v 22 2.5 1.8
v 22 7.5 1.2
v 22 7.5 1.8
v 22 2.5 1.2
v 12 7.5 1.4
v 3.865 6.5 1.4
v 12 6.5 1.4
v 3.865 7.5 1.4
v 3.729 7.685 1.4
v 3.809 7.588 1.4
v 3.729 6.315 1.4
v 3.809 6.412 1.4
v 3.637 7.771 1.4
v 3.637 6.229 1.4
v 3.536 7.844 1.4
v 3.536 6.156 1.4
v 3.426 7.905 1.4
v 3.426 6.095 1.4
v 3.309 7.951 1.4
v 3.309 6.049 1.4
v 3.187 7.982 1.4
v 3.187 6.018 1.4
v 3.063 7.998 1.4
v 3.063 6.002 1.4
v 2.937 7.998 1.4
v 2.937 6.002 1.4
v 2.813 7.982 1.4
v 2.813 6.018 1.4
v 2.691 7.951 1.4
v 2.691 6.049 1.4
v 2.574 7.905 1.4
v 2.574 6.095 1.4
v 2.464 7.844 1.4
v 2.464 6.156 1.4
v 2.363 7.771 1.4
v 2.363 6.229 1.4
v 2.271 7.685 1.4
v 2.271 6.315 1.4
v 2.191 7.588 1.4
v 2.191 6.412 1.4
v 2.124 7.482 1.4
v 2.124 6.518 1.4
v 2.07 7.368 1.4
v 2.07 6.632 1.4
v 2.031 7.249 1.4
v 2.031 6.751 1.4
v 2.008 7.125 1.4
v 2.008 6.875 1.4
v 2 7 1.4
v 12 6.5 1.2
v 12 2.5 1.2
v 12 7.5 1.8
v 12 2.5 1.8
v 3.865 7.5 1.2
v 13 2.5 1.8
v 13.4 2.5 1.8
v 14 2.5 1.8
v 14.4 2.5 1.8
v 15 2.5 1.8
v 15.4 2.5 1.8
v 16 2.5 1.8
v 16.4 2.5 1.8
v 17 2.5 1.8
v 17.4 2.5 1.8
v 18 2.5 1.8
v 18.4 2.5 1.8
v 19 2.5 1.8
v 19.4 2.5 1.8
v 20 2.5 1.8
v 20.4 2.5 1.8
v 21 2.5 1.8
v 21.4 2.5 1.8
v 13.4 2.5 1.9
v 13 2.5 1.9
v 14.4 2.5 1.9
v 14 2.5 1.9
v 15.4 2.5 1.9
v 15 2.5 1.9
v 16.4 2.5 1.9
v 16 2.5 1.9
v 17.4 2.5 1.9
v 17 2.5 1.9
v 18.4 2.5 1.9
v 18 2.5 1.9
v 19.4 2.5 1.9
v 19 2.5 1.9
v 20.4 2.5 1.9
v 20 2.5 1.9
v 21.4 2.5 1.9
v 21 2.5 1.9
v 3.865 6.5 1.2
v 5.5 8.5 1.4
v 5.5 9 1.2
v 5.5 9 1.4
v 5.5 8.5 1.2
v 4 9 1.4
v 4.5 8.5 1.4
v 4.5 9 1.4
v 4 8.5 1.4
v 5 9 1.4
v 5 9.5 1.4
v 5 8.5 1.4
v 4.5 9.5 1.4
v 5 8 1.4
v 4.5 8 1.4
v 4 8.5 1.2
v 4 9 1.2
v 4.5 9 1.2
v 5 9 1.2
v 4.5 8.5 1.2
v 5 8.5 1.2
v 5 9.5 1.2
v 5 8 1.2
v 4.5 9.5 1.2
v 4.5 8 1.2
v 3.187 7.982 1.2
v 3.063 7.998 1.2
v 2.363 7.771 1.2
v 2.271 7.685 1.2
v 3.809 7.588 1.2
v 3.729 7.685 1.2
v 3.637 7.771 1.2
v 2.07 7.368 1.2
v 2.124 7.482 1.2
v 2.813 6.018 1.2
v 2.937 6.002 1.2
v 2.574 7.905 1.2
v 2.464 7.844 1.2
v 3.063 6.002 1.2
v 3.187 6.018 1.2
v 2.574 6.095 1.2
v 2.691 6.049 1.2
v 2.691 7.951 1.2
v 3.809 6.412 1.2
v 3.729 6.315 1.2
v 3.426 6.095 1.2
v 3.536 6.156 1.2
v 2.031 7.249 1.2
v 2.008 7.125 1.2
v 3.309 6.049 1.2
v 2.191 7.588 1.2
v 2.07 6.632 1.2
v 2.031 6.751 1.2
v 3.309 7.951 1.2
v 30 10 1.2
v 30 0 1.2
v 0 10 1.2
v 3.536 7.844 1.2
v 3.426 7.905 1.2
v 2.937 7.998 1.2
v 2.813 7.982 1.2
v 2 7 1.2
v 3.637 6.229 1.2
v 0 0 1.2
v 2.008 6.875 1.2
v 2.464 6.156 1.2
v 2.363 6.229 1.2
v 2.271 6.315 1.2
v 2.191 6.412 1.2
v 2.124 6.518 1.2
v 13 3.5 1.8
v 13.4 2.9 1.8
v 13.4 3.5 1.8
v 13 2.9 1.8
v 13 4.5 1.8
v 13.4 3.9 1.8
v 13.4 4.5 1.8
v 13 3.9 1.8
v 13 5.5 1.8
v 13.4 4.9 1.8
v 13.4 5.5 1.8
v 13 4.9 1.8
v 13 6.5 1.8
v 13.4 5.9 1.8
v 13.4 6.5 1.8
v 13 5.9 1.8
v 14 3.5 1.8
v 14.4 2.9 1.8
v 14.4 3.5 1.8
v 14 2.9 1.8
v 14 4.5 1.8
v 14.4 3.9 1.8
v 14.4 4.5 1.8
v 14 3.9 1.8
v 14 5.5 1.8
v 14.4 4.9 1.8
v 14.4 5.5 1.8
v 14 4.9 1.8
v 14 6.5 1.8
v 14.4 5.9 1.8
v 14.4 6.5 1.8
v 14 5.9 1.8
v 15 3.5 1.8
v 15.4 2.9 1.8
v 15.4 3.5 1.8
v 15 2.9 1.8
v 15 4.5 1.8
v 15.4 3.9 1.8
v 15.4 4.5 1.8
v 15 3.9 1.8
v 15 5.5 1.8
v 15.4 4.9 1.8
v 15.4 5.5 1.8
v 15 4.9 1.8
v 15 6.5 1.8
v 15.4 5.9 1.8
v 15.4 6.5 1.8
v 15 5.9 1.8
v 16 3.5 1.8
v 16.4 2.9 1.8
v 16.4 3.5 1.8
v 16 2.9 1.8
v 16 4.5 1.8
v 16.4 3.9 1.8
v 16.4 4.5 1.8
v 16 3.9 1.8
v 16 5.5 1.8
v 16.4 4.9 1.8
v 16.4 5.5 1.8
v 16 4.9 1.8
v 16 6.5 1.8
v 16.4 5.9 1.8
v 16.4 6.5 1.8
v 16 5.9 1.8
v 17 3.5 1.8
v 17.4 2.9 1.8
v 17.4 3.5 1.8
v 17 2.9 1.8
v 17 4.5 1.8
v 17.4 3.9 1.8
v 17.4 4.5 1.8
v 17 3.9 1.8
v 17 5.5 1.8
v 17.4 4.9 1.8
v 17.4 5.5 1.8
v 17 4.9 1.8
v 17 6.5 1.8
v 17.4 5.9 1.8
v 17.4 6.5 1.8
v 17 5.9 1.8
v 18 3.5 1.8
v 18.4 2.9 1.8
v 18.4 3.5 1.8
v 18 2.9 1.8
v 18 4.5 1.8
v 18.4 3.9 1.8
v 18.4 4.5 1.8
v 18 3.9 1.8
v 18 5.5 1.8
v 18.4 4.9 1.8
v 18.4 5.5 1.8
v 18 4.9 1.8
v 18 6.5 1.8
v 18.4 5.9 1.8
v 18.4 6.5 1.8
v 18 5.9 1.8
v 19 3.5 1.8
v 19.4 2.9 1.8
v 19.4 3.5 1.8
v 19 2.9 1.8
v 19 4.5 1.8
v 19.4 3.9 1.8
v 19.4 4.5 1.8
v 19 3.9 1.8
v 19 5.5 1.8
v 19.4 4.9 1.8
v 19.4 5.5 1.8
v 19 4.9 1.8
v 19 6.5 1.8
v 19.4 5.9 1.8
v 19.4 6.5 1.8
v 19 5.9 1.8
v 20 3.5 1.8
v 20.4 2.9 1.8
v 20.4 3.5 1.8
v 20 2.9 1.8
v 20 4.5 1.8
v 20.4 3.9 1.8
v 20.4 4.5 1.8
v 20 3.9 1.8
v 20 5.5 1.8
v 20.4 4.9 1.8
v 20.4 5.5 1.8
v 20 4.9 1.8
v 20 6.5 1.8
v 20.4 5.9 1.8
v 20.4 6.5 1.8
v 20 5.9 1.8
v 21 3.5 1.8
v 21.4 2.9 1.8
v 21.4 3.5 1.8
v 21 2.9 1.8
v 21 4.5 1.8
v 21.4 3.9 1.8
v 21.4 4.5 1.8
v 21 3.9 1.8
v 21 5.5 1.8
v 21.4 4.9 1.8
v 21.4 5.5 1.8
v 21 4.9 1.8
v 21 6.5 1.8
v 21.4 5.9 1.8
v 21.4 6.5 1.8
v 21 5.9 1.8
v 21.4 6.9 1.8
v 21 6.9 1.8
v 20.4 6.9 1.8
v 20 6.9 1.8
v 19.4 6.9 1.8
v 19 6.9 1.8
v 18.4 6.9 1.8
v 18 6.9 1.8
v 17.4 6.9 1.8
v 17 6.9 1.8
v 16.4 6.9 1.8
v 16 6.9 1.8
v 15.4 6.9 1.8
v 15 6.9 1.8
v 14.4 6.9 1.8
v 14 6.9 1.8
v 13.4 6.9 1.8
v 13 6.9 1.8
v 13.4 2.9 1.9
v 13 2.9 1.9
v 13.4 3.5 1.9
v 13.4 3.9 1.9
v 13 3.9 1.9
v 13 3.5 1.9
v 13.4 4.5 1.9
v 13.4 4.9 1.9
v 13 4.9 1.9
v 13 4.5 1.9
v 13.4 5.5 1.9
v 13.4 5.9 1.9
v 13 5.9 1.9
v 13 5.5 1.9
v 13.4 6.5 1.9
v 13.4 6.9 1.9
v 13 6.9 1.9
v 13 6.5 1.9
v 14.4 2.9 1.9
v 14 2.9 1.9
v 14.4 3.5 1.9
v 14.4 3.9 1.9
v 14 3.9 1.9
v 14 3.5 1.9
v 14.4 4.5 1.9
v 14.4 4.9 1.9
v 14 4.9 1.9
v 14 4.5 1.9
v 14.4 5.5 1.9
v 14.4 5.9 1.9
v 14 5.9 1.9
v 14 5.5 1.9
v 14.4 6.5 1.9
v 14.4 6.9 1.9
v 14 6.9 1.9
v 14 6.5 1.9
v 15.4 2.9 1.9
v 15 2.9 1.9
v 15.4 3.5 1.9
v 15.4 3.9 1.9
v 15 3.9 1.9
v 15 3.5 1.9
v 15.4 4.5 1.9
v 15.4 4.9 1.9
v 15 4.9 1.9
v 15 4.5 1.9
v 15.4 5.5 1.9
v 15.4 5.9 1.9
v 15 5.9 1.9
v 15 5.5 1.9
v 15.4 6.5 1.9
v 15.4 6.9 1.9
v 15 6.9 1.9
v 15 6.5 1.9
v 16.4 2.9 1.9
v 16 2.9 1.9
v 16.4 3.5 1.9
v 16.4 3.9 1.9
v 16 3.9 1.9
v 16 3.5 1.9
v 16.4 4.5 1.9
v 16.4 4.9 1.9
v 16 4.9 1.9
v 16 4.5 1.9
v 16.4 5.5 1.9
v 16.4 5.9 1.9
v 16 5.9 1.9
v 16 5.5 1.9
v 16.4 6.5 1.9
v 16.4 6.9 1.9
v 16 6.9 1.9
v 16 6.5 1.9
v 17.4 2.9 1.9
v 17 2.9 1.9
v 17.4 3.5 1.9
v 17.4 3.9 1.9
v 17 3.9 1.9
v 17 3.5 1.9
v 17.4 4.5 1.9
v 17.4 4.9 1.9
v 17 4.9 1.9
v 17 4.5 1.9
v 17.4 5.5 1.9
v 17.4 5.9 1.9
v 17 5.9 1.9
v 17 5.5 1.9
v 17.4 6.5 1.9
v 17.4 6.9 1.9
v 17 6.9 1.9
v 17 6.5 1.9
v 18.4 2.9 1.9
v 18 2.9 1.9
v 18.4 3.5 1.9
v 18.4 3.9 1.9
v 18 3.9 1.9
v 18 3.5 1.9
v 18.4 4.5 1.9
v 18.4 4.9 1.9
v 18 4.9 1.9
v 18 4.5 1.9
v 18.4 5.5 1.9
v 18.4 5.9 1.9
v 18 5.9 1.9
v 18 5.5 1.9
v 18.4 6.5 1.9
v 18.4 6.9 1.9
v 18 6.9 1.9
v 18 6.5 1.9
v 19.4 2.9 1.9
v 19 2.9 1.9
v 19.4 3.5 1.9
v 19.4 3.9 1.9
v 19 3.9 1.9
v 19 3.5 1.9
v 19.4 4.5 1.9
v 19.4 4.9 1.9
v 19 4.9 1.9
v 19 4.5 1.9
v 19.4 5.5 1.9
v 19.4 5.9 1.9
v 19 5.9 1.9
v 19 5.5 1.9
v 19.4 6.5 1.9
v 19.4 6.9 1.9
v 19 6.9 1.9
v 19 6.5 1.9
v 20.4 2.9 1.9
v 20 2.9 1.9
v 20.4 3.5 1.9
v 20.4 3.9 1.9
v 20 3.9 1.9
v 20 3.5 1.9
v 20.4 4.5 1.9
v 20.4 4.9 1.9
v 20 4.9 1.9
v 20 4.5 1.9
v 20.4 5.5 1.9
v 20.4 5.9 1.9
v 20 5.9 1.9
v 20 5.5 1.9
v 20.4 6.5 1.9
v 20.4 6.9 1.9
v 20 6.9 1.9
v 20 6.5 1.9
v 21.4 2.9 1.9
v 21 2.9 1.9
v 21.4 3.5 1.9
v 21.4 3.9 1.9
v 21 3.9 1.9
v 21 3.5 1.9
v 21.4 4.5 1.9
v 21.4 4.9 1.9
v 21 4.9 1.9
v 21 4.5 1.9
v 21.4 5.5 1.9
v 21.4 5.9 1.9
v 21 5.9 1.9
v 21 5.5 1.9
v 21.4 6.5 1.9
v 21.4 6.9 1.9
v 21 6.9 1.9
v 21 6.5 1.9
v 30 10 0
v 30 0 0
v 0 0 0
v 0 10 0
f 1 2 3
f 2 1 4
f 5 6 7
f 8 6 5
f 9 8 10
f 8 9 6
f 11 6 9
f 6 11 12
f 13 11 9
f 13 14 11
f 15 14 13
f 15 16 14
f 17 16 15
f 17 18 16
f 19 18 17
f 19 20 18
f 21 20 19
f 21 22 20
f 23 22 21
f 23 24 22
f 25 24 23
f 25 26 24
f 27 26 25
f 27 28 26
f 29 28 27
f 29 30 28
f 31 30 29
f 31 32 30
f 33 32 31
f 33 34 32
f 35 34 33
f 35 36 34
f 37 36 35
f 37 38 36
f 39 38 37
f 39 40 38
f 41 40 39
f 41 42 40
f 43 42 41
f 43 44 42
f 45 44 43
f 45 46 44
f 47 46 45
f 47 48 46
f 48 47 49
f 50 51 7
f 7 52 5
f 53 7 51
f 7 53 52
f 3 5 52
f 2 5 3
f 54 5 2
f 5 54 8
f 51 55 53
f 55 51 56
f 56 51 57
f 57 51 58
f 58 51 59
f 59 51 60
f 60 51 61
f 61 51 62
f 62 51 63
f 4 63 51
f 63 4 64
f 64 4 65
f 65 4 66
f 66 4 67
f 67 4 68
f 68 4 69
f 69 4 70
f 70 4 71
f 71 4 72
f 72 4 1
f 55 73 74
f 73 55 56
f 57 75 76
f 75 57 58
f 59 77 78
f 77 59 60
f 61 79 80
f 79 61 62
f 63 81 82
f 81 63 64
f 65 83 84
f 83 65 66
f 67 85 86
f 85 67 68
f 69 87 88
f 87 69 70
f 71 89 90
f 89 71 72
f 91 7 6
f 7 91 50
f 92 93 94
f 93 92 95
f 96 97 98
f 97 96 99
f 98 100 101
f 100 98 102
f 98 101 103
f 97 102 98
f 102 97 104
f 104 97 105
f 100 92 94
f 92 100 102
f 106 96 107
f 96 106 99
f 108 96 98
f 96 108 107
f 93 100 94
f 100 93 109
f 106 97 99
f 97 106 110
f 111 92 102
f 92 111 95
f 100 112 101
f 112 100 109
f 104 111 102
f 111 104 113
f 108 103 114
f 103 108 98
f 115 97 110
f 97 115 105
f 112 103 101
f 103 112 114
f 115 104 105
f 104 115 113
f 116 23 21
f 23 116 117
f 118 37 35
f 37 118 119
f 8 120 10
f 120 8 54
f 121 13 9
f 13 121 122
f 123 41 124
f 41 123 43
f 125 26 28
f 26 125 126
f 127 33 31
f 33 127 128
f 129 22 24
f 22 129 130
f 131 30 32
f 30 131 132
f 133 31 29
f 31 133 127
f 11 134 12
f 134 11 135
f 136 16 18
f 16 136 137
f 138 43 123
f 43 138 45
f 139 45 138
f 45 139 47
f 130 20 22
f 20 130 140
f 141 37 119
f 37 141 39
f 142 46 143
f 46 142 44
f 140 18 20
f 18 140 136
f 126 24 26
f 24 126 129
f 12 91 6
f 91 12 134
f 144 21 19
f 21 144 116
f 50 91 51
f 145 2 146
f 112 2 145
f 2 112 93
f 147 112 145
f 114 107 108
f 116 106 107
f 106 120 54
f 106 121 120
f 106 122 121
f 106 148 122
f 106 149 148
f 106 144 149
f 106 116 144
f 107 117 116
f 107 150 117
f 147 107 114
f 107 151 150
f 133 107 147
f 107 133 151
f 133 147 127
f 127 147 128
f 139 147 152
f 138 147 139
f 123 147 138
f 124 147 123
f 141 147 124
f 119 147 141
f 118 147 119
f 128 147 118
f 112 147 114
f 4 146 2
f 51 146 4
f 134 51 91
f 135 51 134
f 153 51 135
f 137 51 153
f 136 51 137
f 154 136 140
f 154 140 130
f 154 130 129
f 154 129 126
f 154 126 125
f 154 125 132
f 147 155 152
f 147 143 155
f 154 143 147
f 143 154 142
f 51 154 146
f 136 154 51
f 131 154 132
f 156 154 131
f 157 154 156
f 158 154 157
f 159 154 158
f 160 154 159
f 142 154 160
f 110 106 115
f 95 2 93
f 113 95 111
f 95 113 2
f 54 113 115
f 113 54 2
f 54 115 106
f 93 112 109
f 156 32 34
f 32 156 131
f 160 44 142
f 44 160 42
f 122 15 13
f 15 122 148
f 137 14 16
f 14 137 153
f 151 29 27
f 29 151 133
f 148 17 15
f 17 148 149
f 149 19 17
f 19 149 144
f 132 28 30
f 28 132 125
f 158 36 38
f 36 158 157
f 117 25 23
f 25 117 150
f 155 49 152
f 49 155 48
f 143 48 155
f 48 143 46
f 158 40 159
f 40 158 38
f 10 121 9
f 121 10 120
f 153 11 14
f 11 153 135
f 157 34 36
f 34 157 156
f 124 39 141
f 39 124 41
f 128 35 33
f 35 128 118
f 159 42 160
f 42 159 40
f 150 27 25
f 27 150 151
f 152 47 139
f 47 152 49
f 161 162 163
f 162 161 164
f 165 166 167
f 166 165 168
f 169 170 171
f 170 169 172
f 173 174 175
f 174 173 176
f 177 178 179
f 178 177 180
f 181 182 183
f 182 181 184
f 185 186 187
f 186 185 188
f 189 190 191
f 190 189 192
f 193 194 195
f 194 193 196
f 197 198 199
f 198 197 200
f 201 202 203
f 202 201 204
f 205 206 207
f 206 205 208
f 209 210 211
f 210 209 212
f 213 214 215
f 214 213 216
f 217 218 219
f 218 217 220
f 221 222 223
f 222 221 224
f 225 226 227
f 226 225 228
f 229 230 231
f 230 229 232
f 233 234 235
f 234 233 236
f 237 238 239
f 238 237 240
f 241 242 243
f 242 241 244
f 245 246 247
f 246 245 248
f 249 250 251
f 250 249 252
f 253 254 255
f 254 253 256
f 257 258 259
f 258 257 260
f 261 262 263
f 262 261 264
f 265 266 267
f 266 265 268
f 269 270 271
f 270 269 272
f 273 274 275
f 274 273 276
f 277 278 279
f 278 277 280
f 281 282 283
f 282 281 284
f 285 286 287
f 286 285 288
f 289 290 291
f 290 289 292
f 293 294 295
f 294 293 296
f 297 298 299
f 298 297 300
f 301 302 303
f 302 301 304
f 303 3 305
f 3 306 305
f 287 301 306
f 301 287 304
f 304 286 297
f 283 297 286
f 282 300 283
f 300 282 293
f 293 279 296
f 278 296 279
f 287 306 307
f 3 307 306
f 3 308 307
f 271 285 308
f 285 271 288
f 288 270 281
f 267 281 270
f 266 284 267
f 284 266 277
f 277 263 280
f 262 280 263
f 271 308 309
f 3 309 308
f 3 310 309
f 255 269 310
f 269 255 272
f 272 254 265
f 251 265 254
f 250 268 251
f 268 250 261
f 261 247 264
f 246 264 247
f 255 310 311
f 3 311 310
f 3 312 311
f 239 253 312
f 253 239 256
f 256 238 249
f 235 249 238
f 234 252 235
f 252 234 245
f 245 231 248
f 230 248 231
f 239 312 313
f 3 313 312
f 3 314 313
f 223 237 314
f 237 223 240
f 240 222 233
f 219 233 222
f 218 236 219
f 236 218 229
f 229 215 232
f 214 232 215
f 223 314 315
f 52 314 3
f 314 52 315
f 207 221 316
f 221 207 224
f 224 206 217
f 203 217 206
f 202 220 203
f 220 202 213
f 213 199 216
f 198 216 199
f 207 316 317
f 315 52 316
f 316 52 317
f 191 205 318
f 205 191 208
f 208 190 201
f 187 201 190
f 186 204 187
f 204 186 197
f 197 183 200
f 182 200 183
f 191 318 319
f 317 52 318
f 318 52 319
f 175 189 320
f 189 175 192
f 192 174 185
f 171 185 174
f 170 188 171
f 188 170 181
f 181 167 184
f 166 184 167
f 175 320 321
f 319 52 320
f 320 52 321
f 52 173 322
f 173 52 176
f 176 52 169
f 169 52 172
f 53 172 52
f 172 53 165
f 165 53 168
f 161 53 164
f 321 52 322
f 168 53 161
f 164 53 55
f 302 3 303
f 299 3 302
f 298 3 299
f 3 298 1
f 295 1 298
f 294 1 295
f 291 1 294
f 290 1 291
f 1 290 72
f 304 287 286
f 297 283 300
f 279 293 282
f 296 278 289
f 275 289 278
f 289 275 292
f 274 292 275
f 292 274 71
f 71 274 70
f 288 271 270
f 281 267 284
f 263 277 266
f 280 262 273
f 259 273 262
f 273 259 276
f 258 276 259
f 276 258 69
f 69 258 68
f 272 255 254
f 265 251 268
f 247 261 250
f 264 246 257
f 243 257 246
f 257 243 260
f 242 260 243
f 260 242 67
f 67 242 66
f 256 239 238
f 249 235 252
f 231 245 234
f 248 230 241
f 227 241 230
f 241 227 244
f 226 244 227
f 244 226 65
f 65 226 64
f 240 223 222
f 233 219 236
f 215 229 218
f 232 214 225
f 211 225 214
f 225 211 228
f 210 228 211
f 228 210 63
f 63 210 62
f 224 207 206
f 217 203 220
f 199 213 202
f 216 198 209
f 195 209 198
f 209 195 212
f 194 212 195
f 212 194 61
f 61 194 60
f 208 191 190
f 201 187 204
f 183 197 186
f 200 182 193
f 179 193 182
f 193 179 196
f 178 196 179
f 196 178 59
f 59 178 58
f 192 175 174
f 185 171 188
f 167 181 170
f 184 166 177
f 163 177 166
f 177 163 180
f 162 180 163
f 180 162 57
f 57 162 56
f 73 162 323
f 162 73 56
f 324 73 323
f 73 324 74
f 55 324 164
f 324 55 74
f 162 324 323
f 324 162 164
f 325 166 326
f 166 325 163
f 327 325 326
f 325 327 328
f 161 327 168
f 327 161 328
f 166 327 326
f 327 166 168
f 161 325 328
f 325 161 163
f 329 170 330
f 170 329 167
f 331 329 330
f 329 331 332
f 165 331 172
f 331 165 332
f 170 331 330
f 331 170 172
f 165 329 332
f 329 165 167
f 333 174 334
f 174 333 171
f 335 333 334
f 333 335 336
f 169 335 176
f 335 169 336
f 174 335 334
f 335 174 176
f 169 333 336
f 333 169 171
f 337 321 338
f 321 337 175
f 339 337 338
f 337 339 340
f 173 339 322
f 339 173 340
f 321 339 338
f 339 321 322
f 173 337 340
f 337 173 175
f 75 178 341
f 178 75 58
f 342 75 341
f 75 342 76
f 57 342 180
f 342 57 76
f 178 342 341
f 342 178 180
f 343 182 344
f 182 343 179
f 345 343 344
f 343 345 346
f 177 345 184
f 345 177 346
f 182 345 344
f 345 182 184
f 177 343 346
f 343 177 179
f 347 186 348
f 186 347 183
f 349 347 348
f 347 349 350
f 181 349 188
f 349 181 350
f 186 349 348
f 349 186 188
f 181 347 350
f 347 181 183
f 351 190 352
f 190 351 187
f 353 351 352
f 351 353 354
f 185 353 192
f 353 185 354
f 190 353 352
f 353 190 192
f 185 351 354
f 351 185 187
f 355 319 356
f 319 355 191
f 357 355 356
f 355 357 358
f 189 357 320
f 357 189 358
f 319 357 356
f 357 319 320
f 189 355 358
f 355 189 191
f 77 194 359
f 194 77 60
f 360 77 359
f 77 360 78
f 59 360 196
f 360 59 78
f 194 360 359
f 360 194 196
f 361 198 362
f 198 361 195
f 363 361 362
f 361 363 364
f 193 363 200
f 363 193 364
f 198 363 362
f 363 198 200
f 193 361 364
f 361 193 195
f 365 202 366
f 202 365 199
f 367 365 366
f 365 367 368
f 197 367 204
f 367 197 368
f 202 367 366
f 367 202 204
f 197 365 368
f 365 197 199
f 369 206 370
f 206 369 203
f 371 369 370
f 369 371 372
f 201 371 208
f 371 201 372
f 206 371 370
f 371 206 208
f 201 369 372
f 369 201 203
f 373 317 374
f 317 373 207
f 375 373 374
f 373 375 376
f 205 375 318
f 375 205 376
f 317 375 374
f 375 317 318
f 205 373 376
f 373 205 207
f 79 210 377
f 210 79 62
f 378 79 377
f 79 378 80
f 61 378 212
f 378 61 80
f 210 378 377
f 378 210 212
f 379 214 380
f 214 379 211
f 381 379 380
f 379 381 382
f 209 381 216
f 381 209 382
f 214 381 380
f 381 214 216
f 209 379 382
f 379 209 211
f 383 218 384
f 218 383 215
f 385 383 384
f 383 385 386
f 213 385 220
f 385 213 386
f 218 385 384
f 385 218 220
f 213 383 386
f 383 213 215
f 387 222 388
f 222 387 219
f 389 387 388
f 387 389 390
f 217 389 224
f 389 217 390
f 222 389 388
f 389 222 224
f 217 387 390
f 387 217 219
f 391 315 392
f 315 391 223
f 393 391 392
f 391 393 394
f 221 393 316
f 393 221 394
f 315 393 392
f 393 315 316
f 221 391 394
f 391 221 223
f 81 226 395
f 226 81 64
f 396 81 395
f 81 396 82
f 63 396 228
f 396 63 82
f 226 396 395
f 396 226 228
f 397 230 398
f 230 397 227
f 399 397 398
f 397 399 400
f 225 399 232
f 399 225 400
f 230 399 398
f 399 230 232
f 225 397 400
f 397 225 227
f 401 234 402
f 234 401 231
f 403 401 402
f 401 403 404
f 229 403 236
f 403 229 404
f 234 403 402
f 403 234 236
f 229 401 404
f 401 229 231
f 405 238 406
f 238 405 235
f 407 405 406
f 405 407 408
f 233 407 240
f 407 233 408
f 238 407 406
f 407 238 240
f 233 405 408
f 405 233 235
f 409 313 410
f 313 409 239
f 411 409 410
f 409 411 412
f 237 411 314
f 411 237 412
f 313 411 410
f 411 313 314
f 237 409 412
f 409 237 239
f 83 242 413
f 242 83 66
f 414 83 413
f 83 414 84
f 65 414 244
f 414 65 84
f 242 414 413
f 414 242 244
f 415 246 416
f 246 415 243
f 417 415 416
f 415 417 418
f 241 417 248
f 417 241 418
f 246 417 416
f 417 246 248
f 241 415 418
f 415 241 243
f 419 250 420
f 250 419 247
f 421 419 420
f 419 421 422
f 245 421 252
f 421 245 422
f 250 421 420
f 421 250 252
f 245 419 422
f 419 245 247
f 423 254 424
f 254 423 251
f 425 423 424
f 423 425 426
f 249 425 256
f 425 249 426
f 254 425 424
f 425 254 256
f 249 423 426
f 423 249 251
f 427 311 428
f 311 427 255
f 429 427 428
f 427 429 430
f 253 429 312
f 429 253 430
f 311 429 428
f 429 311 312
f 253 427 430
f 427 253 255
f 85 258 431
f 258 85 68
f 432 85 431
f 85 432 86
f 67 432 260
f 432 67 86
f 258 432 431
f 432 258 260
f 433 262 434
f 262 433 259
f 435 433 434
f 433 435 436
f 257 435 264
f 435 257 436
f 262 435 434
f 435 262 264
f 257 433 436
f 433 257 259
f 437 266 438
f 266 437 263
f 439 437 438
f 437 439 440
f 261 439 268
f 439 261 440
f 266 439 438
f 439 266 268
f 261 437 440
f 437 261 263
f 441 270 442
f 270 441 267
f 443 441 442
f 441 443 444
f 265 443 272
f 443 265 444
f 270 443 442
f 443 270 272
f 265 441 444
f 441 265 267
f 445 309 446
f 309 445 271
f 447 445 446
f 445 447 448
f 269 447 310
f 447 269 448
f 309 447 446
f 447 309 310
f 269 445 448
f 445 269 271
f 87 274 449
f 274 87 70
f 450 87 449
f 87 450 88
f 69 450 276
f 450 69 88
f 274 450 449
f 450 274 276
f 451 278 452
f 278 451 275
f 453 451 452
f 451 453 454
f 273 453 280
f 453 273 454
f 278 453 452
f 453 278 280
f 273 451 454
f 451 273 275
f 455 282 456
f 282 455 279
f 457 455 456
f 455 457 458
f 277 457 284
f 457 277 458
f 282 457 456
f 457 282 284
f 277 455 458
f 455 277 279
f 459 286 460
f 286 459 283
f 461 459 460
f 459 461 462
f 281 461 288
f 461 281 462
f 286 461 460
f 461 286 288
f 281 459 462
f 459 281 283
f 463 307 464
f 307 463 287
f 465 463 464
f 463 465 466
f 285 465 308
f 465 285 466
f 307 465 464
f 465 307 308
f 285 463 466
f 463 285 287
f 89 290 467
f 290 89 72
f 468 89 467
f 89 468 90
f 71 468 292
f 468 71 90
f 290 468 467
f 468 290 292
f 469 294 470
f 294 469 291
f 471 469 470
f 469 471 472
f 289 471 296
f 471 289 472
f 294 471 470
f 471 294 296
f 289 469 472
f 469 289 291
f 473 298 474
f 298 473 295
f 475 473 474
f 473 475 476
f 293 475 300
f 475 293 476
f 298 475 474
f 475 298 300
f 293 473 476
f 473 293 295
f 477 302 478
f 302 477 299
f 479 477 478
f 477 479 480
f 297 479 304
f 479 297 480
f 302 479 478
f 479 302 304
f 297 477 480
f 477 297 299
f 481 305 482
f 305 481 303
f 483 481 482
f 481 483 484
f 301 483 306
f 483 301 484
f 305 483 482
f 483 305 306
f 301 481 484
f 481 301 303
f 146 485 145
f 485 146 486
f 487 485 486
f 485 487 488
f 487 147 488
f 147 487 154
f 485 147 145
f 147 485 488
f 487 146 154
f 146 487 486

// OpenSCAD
//Definitions
slide_dim = [30, 10, 1.2];
kmpr_dim = [30, 10, 0.2];
pattern_dim = [.4, .4, 0.3];
pad_nioh2_dim = [10, 5, 0.9];
pad_center_dim = [10, 5, 0.5];
pad_connect_dim = [15, 1, 0.5];
pad_circle_r = 1;
pad_circle_h = .2;
plus1_dim = [1.5, 0.5, 0.5];
plus2_dim = [0.5, 1.5, 0.5];

glass_col = [.85, .95, 1];
kmpr_col = [.85, .74, .22, 0.5];
ni_col = [.55, .55, .55];
niox_col = [.44, .44, .44];
nioh2_col = [.11, .77, .22, .5];

//Glass Slide
color(glass_col) cube(slide_dim);

//KMPR Photoresist layer
//color(kmpr_col) translate([0, 0, 1.1]) cube(kmpr_dim);

//Pad removed from KMPR
/*
difference() {
	color(kmpr_col) translate([0, 0, 1.1]) cube(kmpr_dim);
	color(kmpr_col) translate([12, 2.5, .9]) cube(pad_center_dim);
	color(kmpr_col) translate([3, 6.5, .9]) cube(pad_connect_dim);
	color(kmpr_col) translate([3, 6.5, .9]) cube(pad_connect_dim);
	color(kmpr_col) translate([4, 8.5, .9]) cube(plus1_dim);
	color(kmpr_col) translate([4.5, 8.0, .9]) cube(plus2_dim);
	color(kmpr_col) translate([3, 7, 1.25]) cylinder(h=pad_circle_h, r=pad_circle_r, $fn=50, center=true);
}*/

//Nickel pad 
union() {
	color(ni_col) translate([12, 2.5, .9]) cube(pad_center_dim);
	color(ni_col) translate([3, 6.5, .9]) cube(pad_connect_dim);
	color(ni_col) translate([3, 6.5, .9]) cube(pad_connect_dim);
	color(ni_col) translate([4, 8.5, .9]) cube(plus1_dim);
	color(ni_col) translate([4.5, 8.0, .9]) cube(plus2_dim);
	color(ni_col) translate([3, 7, 1.3]) cylinder(h=pad_circle_h, r=pad_circle_r, $fn=50, center=true);
}

//KMPR mask on top of nickel pad
//color(kmpr_col) translate([0, 0, 1.4]) cube(kmpr_dim);

//Pattern developed into KMPR mask
/*difference() {
	color(kmpr_col) translate([0, 0, 1.35]) cube(kmpr_dim);
	for (i = [0:8], j = [0:4]) {
		translate([i + 13, j + 2.5, 1.3]) cube(pattern_dim);
	}
}*/

//Nickel oxide pattern
for (i = [0:8], j = [0:4]) {
		translate([i + 13, j + 2.5, 1.5]) color(niox_col) cube(pattern_dim);
	}

//Nickel hydroxide layer
color(nioh2_col) translate([12, 2.5, .9]) cube(pad_nioh2_dim);
for (i = [0:8], j = [0:4]) {
		translate([i + 13, j + 2.5, 1.6]) color(nioh2_col) cube(pattern_dim);
	}
